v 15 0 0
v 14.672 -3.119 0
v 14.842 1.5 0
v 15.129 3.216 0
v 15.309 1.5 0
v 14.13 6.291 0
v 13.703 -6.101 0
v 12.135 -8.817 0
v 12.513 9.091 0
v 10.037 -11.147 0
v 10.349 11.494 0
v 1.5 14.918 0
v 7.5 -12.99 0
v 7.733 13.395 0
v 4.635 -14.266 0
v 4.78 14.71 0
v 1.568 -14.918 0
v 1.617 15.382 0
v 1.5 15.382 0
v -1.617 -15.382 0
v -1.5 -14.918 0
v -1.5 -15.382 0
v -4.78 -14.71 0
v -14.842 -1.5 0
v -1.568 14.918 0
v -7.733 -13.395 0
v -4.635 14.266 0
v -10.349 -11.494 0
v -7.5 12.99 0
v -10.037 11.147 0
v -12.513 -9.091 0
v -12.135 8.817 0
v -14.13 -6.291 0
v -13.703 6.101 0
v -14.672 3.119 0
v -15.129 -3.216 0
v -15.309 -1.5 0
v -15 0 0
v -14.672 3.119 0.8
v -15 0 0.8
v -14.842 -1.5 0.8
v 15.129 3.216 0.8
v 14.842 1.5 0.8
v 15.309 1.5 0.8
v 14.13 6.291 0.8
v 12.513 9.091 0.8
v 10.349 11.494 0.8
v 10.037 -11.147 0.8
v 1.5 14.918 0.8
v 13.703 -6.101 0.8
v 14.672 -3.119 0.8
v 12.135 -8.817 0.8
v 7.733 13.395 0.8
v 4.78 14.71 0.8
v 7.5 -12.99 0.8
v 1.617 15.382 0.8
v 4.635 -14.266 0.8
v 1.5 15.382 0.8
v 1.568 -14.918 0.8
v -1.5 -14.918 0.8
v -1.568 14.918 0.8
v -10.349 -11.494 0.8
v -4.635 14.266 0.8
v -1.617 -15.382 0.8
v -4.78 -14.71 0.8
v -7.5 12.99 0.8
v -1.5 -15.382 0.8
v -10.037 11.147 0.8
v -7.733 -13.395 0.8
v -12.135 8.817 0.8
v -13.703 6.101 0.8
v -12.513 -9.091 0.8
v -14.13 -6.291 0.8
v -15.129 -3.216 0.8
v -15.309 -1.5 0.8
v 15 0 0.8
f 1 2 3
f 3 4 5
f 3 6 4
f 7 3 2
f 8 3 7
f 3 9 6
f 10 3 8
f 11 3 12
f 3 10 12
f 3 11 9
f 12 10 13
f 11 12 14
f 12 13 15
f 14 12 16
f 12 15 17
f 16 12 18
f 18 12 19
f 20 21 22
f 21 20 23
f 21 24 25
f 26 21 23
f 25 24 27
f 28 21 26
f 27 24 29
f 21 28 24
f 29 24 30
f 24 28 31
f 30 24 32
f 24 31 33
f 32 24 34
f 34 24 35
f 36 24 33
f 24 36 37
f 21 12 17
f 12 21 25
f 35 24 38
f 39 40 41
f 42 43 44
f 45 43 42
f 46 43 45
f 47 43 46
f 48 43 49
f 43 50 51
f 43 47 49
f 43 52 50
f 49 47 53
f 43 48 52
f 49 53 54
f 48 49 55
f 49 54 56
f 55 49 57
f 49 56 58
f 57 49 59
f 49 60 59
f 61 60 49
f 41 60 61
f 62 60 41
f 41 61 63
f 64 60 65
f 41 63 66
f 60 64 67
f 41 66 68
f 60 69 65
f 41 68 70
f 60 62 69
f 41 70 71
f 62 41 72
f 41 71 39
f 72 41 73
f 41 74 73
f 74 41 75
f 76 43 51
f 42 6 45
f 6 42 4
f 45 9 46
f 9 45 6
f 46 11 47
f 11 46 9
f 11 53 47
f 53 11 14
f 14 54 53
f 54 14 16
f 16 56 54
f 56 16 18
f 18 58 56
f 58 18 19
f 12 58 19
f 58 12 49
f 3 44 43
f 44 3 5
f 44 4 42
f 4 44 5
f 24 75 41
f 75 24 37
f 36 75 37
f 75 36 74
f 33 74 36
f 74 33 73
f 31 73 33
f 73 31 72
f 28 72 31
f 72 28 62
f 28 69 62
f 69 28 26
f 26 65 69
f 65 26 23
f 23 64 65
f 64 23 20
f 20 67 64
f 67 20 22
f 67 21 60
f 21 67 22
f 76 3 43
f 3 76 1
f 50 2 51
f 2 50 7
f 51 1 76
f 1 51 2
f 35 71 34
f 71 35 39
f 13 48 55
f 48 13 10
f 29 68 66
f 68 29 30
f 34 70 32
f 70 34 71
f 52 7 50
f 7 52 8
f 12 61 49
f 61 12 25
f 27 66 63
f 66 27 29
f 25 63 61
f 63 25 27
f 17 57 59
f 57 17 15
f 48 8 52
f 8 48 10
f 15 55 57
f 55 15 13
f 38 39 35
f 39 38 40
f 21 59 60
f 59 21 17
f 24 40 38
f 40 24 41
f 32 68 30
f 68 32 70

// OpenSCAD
cylinderID = 30;
cylinderHeight=0.8;
//Set the threshold grey level to cut through (0-100%)
Threshold=-50; //[0:100]
//Invert grayscale image?
Inverted=false; //[True:Yes, False:No]
//Load an image to emboss. Simple, high contrast images like logos work best.
image_file = "image-surface.dat"; // [image_surface:100x100]
difference() {
    union() {
        linear_extrude (height=0.8) {
            difference() {
                circle(d=30.934);
                polygon(points = [[-40,40],[1.5,40],[1.5,1.5],[40,1.5],[40,-40],[-1.5,-40],[-1.5,-1.5],[-40,-1.5]]);
            }
        }
        cylinder(h=0.8, d=30);
    }
        scale ([0.18,0.18,10]) translate([0,0,Threshold]) surface(file = image_file , center = true, convexity = 1, invert=Inverted);
}
